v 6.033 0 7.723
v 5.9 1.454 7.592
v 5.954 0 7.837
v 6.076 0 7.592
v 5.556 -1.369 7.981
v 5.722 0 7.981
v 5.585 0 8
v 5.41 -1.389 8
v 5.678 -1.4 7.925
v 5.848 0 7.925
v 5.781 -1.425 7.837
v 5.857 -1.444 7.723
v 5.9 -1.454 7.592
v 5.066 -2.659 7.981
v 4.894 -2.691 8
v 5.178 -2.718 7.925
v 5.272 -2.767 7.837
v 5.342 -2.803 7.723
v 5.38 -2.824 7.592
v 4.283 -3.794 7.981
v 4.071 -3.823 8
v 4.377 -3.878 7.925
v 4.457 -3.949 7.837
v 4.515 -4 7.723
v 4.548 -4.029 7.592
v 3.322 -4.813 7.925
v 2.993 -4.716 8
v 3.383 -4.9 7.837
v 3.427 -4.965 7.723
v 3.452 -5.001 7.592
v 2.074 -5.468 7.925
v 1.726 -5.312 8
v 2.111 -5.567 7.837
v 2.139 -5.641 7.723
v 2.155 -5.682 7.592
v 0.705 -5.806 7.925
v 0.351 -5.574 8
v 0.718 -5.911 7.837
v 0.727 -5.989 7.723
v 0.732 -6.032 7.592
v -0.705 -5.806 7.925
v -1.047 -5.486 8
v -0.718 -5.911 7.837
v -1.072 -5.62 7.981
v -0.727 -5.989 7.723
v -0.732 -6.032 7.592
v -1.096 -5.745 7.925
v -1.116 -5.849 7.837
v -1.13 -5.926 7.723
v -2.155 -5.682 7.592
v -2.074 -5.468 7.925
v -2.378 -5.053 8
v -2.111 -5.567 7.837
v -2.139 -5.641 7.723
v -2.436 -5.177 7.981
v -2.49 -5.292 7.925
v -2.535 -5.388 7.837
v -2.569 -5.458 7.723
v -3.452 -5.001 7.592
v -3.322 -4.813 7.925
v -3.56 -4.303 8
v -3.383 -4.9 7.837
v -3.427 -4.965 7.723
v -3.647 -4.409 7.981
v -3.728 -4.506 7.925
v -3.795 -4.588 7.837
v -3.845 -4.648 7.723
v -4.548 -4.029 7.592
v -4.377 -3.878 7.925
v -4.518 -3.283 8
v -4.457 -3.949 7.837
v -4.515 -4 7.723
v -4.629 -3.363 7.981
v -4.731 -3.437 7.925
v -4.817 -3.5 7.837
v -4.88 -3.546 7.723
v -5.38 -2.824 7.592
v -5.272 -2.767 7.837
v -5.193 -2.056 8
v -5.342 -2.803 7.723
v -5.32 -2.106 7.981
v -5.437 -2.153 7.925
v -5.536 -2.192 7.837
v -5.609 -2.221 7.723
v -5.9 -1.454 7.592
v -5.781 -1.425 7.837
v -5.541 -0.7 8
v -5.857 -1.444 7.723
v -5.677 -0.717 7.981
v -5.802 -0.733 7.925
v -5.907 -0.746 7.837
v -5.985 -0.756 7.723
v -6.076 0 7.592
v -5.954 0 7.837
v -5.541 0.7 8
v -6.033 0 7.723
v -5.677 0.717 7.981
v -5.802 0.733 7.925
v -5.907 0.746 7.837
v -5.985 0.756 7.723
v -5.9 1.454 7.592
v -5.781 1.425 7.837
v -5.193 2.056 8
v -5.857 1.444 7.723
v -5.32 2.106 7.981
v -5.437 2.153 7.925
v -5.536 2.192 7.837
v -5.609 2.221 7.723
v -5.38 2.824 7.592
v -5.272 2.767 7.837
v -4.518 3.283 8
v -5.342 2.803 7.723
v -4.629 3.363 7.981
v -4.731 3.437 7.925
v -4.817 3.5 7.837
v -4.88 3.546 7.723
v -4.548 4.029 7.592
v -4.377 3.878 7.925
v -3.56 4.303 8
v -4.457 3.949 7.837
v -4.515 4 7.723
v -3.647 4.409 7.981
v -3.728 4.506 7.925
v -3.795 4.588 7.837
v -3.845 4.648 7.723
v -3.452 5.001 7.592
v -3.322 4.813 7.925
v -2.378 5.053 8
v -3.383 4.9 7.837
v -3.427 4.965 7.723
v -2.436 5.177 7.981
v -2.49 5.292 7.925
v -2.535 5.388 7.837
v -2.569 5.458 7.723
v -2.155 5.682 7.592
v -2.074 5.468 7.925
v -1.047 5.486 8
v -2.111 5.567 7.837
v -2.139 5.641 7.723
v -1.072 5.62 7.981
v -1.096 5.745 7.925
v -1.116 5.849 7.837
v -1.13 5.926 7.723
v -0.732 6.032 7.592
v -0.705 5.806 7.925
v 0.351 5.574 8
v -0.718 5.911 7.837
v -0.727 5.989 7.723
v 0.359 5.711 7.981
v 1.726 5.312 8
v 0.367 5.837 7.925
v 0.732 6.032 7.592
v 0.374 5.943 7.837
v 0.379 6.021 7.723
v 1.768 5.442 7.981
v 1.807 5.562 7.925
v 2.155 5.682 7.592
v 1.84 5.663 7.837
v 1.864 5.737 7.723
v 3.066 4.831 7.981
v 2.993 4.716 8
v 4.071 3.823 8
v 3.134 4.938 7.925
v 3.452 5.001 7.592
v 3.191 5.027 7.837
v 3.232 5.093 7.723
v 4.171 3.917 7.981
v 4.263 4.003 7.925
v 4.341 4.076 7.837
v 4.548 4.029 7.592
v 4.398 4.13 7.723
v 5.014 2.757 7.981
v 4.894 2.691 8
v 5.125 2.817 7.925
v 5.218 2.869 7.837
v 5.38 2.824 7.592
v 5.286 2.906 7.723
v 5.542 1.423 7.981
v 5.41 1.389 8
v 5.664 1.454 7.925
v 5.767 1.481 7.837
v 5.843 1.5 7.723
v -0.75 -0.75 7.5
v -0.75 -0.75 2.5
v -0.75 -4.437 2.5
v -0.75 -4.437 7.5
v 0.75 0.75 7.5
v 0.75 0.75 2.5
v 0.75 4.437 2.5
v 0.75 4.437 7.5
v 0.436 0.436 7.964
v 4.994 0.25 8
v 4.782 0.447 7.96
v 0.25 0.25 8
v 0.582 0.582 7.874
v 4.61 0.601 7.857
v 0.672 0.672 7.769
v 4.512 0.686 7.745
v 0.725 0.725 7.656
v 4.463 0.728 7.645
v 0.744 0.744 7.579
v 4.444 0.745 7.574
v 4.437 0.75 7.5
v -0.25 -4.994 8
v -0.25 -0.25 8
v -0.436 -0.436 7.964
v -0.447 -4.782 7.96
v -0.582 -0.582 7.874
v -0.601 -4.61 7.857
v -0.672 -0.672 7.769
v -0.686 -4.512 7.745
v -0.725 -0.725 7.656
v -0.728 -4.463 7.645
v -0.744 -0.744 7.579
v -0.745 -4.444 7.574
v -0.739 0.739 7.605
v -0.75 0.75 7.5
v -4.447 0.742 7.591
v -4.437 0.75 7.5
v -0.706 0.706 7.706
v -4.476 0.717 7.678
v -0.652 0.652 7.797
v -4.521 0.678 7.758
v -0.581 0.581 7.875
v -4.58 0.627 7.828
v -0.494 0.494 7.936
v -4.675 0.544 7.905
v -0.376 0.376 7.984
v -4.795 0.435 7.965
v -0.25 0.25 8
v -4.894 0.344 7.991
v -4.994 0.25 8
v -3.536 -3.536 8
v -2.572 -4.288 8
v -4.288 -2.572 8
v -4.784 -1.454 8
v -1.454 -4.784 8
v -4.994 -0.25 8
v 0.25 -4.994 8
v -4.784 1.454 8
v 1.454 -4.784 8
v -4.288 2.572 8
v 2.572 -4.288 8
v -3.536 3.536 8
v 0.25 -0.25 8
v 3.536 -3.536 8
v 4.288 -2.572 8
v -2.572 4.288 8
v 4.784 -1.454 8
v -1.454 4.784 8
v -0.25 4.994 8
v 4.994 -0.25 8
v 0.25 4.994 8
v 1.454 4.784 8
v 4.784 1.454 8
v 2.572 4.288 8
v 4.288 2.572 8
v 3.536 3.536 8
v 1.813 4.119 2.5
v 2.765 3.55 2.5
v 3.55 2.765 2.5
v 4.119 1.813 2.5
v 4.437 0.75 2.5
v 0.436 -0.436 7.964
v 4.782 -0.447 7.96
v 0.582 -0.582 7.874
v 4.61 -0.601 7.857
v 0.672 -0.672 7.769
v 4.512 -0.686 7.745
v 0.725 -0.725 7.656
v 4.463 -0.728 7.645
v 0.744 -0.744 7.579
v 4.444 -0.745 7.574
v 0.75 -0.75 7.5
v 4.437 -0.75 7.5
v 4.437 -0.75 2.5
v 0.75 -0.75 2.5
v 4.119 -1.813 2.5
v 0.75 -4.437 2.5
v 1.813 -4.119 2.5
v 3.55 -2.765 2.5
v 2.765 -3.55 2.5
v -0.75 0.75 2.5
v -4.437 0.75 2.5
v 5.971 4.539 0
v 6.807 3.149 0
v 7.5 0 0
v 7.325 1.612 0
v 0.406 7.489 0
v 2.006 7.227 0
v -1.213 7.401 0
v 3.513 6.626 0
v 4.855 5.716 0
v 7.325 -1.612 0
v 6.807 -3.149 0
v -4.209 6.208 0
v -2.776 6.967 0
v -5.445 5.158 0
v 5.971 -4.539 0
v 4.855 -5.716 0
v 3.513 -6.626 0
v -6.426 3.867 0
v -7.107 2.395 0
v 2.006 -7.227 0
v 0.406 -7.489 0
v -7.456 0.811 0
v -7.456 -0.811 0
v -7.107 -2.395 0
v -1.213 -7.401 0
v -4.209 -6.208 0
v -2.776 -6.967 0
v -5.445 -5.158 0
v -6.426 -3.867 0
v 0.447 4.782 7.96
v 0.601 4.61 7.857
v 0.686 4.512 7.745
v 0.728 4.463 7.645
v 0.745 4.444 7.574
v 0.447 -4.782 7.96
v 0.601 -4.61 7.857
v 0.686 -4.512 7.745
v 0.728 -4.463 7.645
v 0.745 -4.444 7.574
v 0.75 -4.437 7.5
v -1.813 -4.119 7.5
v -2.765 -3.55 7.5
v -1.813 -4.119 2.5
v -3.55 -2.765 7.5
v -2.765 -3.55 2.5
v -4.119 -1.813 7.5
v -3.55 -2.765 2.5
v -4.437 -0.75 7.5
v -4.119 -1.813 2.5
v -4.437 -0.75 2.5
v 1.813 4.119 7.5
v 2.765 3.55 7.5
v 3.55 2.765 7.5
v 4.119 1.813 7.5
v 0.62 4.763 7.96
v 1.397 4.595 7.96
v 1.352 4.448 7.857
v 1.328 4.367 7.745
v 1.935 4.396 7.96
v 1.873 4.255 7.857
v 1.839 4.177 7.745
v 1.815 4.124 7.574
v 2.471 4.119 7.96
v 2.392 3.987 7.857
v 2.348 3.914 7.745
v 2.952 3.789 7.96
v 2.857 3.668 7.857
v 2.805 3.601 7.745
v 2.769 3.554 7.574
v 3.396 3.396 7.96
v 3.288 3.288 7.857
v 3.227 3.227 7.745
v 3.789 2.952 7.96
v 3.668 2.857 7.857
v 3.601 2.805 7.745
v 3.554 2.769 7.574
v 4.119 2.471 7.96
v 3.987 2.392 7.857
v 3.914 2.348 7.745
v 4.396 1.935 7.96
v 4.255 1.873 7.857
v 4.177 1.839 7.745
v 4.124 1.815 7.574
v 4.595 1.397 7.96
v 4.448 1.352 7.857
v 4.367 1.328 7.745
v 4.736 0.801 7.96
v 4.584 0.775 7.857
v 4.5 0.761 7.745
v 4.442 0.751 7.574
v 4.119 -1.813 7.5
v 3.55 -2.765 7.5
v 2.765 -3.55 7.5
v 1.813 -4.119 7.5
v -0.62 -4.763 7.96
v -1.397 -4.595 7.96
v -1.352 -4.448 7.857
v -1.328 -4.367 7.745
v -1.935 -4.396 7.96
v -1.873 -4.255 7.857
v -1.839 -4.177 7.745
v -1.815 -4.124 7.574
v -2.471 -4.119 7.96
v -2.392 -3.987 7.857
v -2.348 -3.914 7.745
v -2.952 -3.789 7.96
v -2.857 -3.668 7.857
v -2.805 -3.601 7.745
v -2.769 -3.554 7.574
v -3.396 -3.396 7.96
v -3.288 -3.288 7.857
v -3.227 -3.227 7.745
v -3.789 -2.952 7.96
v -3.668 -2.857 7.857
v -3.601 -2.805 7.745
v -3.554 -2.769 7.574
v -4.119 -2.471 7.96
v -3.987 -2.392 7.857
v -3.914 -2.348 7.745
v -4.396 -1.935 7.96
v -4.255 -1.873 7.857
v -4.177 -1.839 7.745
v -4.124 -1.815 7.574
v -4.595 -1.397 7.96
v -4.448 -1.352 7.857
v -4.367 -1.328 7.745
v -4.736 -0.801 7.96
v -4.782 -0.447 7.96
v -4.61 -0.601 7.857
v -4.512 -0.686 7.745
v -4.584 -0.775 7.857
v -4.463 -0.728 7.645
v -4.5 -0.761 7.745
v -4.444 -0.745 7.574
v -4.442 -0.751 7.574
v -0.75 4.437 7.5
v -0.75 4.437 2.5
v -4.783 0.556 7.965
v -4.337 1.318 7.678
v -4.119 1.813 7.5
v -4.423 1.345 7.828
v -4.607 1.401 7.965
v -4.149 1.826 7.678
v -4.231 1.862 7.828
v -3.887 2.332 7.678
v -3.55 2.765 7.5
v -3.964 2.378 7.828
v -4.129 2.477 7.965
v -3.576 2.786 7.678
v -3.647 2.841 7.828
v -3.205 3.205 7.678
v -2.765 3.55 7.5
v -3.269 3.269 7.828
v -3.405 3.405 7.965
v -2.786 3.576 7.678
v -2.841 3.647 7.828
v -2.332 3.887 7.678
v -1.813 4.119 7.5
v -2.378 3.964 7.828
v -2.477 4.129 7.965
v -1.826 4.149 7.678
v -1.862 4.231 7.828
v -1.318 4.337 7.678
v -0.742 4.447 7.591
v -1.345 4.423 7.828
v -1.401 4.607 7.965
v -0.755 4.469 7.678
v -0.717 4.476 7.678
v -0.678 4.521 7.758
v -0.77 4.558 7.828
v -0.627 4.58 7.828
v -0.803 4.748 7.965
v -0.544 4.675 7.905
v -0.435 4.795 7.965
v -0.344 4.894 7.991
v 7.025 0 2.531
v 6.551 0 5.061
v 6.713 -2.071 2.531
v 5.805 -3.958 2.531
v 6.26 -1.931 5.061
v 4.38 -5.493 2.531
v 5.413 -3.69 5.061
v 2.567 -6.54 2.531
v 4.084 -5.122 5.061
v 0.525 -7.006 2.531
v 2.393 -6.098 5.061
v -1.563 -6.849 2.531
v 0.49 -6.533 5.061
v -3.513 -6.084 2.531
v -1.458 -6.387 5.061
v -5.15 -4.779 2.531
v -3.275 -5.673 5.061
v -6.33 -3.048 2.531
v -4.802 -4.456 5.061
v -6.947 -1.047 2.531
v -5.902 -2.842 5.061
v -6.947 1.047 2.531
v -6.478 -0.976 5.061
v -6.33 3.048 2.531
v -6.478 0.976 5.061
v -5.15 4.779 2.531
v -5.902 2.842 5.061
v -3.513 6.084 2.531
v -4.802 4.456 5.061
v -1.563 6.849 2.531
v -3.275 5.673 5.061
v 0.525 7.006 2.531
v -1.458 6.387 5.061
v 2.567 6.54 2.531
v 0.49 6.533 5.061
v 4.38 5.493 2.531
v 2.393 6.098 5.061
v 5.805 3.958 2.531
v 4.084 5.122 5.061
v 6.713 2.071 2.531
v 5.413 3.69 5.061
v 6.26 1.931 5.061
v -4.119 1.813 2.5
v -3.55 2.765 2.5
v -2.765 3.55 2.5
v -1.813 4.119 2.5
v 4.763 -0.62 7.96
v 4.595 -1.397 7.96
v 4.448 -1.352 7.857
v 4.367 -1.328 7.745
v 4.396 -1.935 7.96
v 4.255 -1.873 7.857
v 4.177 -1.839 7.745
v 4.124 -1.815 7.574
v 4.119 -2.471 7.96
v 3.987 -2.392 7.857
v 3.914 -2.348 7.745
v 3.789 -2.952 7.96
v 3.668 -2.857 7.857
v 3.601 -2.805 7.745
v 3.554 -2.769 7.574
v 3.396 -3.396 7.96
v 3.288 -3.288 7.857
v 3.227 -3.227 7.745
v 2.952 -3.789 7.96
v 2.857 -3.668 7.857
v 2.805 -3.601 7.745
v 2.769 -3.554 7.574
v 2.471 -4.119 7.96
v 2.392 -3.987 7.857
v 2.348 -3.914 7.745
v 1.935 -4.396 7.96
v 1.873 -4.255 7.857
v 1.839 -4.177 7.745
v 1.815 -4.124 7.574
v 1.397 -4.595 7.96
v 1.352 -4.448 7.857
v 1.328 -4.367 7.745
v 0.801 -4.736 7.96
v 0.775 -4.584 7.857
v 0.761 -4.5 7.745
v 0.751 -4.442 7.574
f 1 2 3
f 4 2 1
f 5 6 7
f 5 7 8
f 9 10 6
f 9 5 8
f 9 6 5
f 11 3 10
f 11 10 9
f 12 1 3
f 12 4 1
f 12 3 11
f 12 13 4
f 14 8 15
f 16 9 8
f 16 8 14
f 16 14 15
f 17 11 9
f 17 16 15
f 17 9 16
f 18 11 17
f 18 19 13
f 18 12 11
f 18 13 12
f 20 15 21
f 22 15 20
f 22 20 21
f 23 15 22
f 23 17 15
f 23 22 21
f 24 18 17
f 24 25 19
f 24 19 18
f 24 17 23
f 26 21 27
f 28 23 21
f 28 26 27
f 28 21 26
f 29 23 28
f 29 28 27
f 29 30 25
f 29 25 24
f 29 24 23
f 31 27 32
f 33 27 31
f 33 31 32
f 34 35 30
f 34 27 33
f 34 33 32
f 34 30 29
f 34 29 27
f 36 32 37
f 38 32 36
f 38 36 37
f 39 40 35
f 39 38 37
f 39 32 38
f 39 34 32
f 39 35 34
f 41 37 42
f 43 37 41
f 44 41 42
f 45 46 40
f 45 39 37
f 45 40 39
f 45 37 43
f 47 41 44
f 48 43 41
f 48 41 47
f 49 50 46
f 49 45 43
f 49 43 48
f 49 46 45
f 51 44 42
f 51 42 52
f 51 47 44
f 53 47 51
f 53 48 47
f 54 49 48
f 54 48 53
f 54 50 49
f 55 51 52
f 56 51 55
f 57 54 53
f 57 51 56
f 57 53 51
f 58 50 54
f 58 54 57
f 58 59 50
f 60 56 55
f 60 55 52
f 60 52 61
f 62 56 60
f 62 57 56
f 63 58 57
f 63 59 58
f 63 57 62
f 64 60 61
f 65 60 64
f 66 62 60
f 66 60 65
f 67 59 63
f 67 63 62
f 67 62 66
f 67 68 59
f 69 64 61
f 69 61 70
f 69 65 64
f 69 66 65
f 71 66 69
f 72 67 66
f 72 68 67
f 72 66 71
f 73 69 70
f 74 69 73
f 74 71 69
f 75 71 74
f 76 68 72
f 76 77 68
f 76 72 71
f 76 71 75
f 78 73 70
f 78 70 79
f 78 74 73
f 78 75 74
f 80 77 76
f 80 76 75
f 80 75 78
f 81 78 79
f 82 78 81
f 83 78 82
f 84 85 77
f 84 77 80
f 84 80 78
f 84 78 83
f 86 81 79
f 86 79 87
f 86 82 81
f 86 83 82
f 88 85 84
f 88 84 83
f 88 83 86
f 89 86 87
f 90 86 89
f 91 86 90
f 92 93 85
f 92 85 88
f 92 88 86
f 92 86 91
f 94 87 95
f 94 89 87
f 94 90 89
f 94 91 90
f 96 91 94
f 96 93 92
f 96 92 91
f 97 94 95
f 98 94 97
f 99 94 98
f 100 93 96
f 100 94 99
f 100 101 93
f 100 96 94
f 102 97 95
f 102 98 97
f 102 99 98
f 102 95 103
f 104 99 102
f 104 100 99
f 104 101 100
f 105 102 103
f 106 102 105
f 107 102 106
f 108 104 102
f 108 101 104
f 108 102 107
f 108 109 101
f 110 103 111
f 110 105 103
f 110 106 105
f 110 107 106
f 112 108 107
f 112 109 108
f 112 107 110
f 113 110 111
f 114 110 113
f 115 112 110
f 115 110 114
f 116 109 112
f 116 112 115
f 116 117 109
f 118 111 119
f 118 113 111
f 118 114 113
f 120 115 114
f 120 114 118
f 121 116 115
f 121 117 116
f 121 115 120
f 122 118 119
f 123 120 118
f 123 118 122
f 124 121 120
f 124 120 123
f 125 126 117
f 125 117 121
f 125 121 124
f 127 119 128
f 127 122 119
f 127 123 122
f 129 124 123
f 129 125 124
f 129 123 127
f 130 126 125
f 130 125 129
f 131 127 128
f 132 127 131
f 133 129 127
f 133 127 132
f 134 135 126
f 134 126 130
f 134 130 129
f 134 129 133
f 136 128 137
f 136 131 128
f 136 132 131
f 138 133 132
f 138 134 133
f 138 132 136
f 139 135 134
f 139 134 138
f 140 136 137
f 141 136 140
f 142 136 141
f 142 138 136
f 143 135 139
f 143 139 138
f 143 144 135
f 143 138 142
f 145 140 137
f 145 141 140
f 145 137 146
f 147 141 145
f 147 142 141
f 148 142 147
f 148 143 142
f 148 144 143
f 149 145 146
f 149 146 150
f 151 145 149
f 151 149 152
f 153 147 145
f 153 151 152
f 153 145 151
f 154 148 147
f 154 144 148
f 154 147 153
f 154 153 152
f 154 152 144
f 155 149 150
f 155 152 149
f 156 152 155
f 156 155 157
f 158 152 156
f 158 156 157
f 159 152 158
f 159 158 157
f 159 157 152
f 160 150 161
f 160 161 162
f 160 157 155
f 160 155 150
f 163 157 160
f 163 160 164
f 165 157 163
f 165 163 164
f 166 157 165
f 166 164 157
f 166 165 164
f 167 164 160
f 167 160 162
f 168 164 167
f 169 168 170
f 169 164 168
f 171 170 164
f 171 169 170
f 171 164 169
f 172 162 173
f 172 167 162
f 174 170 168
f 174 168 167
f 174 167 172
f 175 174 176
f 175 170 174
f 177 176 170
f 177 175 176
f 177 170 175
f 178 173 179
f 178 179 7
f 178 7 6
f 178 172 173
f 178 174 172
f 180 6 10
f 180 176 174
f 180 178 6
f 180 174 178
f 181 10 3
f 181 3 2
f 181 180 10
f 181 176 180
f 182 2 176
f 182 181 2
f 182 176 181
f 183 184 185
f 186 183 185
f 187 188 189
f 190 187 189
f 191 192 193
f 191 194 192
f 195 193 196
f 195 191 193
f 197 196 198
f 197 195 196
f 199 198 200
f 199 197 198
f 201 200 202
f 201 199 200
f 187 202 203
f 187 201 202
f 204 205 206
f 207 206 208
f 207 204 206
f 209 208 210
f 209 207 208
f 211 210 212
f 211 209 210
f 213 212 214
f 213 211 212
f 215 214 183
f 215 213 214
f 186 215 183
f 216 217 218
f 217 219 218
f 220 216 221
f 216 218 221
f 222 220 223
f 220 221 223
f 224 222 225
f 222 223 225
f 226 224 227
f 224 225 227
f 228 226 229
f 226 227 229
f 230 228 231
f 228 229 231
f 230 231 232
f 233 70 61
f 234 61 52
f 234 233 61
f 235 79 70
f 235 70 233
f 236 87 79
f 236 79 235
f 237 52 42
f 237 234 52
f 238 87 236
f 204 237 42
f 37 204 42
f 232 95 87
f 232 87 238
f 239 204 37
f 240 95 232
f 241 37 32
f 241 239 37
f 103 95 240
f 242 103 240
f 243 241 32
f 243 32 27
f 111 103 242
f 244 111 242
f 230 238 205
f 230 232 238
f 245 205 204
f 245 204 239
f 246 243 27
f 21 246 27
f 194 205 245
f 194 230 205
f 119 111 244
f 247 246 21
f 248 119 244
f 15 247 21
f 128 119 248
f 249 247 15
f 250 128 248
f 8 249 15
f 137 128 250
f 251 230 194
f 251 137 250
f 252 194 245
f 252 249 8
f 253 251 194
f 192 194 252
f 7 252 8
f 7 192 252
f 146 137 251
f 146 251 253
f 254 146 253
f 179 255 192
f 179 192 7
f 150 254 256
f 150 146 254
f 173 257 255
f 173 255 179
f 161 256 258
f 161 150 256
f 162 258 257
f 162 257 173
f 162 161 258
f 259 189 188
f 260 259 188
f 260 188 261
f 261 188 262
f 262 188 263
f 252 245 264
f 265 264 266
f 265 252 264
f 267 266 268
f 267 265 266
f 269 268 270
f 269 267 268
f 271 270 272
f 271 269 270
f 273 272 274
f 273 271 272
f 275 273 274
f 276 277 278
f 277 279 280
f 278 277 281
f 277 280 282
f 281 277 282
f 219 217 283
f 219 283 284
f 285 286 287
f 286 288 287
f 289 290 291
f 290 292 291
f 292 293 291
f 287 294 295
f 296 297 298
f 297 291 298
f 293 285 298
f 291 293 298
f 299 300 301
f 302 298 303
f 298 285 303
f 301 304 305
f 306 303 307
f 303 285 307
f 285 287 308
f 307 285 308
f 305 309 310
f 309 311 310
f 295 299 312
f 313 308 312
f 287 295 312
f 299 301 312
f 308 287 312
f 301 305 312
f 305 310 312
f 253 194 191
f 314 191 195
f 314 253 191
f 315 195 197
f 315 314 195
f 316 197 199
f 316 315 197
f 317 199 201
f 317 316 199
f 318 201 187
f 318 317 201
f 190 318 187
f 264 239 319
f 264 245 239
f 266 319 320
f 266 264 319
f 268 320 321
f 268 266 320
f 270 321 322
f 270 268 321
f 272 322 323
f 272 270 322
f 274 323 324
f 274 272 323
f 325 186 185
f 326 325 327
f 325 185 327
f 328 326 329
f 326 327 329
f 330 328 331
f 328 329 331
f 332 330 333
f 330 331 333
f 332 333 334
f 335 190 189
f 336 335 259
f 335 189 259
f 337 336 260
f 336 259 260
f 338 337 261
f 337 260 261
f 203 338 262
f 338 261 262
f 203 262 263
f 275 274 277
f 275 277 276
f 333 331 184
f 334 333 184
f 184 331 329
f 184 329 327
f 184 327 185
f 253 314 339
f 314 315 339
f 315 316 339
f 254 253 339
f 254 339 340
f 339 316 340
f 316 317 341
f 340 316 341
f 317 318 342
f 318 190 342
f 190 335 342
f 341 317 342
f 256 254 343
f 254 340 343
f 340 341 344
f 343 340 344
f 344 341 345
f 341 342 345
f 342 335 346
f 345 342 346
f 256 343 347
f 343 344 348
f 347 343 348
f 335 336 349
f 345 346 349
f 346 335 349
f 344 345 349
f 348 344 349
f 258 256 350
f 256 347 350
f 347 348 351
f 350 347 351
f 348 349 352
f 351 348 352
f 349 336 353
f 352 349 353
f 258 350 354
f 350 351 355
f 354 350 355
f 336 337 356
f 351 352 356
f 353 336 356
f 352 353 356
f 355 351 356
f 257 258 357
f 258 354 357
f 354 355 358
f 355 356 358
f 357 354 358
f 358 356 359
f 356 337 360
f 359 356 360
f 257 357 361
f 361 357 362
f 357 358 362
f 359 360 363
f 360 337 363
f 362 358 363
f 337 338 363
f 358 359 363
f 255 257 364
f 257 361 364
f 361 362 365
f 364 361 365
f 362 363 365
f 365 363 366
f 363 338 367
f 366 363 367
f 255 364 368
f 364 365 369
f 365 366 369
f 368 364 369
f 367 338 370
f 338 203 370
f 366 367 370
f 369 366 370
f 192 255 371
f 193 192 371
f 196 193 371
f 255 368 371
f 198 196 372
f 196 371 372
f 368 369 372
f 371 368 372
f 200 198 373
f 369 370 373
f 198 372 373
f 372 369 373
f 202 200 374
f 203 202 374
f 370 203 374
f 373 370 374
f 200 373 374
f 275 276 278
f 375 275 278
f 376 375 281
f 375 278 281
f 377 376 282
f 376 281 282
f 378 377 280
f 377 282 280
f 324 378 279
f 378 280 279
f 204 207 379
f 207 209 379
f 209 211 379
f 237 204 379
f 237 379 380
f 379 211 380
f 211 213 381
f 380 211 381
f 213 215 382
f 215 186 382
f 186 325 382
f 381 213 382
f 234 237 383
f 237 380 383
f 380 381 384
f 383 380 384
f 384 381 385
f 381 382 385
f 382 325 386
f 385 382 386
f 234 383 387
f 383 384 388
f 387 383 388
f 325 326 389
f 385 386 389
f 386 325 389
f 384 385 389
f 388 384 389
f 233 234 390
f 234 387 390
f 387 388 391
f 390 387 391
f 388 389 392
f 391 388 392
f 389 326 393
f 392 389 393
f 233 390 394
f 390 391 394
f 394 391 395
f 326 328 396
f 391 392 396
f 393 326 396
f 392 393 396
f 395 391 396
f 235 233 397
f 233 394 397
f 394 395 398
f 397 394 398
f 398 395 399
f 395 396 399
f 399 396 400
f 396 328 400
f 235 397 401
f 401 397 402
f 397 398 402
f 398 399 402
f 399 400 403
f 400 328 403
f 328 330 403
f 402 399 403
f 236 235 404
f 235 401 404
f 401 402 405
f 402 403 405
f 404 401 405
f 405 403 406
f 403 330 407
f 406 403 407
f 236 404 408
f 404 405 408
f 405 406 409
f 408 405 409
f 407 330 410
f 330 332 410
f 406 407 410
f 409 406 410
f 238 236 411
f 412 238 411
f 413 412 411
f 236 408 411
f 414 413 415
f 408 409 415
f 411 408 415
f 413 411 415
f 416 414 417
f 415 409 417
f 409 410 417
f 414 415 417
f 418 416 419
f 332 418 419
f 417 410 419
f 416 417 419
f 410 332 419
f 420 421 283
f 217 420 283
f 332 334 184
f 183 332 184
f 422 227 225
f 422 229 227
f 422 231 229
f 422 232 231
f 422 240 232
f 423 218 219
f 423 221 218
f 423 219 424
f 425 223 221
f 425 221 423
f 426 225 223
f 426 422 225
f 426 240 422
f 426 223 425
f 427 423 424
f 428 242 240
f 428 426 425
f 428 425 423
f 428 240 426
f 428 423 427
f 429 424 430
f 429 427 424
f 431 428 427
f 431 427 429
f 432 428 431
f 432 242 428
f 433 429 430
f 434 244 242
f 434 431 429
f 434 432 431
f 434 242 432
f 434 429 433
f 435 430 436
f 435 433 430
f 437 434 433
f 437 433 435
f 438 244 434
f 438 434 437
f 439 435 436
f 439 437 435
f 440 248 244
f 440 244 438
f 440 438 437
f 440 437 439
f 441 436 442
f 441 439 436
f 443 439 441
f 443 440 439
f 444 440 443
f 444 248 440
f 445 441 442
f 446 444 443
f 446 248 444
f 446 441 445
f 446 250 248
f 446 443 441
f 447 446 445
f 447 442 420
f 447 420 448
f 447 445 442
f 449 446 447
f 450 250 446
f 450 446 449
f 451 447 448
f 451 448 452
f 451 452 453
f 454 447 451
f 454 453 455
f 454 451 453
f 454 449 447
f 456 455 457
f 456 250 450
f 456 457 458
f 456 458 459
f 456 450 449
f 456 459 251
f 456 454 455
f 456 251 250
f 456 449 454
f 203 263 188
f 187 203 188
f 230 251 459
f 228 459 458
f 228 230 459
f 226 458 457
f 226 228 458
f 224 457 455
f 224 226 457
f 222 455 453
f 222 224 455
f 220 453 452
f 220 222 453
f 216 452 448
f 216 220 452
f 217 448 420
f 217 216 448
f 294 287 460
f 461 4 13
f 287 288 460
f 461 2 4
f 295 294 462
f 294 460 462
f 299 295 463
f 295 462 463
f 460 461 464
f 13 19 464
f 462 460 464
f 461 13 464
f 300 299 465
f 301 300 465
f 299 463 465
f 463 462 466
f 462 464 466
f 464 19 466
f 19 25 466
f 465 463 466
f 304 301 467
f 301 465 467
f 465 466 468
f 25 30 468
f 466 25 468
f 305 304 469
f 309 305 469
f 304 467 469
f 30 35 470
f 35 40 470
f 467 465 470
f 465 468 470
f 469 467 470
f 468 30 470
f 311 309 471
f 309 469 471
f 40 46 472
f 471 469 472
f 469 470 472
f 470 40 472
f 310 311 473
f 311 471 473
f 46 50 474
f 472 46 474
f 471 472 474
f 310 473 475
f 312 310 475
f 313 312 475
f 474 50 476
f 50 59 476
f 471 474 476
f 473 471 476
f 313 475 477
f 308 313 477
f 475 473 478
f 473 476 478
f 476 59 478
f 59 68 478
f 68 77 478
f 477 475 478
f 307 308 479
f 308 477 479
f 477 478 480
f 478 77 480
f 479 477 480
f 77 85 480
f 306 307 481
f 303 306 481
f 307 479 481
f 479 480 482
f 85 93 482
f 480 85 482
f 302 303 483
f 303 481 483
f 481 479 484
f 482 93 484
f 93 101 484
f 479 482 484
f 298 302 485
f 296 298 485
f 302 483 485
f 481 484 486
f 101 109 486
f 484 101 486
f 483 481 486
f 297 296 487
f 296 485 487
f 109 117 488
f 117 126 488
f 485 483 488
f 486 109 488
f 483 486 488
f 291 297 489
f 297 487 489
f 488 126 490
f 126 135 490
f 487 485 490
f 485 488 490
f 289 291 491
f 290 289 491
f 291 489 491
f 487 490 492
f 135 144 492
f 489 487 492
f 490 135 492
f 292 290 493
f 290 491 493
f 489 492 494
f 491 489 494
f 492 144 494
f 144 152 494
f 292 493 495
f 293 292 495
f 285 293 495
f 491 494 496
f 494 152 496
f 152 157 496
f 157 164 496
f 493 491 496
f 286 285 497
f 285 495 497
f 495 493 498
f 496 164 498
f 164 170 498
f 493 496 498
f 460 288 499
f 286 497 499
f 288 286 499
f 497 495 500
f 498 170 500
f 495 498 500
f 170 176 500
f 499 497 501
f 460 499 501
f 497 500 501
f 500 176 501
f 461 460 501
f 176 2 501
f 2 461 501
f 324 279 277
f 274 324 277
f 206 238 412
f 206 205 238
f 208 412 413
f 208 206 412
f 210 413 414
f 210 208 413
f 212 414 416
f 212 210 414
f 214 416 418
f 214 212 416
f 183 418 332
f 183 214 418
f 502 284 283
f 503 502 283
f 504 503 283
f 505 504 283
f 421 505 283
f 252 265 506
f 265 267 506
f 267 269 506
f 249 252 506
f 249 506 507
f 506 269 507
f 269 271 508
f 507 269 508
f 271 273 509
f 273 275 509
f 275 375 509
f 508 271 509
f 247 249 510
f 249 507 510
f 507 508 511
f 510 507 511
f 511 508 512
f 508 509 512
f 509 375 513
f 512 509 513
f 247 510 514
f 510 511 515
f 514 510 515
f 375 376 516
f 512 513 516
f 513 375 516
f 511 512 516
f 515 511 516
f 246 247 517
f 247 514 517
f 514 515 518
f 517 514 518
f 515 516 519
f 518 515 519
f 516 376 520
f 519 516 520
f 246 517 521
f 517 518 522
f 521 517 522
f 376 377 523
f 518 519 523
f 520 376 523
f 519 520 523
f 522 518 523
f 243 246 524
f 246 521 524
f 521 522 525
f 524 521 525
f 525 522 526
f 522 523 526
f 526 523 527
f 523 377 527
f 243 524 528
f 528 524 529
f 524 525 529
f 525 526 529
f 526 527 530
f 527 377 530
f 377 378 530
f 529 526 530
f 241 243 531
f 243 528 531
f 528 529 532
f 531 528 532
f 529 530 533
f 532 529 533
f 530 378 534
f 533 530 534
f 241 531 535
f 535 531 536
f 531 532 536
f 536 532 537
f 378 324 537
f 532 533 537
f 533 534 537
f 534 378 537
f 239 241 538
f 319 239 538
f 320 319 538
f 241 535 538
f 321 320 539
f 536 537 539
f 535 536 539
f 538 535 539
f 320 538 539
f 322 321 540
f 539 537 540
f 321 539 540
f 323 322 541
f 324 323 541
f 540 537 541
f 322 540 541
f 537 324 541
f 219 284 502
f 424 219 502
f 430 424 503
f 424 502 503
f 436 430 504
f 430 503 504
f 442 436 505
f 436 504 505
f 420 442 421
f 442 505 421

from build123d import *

# Parameters (mm, degrees)
F3_DEPTH = 5.5
F4_R     = 0.5


with BuildPart() as f1:
    # F0 (on Front) → F1 (revolve)
    with BuildSketch(Plane.XZ):
        Polygon((0, 2.5), (0, 0), (7.5, 0), (6, 8), (4.5, 8), (4.5, 2.5), align=None)
    revolve(axis=Axis((0, 0, 1.25), (0, 0, -1)))

    # F2 (on face) → F3 (join, through all)
    with BuildSketch(Plane.XY.offset(2.5)):
        Polygon((-0.75, 0.75), (-5, 0.75), (-5, -0.75), (-0.75, -0.75), (-0.75, -5), (0.75, -5), (0.75, -0.75), (5, -0.75), (5, 0.75), (0.75, 0.75), (0.75, 5), (-0.75, 5), align=None)
    extrude(amount=F3_DEPTH)

    # F4
    f4_edges = [f1.edges().sort_by_distance(p)[0] for p in [
        (-6, 0, 8),
        (-2.59353, -0.75, 8),
        (-0.75, -2.59353, 8),
        (-3.181981, -3.181981, 8),
        (-3.181981, 3.181981, 8),
        (-2.59353, 0.75, 8),
        (-0.75, 2.59353, 8),
        (0.75, 2.59353, 8),
        (3.181981, 3.181981, 8),
        (2.59353, 0.75, 8),
        (2.59353, -0.75, 8),
        (3.181981, -3.181981, 8),
        (0.75, -2.59353, 8),
    ]]
    fillet(f4_edges, radius=F4_R)


solid = f1.part
